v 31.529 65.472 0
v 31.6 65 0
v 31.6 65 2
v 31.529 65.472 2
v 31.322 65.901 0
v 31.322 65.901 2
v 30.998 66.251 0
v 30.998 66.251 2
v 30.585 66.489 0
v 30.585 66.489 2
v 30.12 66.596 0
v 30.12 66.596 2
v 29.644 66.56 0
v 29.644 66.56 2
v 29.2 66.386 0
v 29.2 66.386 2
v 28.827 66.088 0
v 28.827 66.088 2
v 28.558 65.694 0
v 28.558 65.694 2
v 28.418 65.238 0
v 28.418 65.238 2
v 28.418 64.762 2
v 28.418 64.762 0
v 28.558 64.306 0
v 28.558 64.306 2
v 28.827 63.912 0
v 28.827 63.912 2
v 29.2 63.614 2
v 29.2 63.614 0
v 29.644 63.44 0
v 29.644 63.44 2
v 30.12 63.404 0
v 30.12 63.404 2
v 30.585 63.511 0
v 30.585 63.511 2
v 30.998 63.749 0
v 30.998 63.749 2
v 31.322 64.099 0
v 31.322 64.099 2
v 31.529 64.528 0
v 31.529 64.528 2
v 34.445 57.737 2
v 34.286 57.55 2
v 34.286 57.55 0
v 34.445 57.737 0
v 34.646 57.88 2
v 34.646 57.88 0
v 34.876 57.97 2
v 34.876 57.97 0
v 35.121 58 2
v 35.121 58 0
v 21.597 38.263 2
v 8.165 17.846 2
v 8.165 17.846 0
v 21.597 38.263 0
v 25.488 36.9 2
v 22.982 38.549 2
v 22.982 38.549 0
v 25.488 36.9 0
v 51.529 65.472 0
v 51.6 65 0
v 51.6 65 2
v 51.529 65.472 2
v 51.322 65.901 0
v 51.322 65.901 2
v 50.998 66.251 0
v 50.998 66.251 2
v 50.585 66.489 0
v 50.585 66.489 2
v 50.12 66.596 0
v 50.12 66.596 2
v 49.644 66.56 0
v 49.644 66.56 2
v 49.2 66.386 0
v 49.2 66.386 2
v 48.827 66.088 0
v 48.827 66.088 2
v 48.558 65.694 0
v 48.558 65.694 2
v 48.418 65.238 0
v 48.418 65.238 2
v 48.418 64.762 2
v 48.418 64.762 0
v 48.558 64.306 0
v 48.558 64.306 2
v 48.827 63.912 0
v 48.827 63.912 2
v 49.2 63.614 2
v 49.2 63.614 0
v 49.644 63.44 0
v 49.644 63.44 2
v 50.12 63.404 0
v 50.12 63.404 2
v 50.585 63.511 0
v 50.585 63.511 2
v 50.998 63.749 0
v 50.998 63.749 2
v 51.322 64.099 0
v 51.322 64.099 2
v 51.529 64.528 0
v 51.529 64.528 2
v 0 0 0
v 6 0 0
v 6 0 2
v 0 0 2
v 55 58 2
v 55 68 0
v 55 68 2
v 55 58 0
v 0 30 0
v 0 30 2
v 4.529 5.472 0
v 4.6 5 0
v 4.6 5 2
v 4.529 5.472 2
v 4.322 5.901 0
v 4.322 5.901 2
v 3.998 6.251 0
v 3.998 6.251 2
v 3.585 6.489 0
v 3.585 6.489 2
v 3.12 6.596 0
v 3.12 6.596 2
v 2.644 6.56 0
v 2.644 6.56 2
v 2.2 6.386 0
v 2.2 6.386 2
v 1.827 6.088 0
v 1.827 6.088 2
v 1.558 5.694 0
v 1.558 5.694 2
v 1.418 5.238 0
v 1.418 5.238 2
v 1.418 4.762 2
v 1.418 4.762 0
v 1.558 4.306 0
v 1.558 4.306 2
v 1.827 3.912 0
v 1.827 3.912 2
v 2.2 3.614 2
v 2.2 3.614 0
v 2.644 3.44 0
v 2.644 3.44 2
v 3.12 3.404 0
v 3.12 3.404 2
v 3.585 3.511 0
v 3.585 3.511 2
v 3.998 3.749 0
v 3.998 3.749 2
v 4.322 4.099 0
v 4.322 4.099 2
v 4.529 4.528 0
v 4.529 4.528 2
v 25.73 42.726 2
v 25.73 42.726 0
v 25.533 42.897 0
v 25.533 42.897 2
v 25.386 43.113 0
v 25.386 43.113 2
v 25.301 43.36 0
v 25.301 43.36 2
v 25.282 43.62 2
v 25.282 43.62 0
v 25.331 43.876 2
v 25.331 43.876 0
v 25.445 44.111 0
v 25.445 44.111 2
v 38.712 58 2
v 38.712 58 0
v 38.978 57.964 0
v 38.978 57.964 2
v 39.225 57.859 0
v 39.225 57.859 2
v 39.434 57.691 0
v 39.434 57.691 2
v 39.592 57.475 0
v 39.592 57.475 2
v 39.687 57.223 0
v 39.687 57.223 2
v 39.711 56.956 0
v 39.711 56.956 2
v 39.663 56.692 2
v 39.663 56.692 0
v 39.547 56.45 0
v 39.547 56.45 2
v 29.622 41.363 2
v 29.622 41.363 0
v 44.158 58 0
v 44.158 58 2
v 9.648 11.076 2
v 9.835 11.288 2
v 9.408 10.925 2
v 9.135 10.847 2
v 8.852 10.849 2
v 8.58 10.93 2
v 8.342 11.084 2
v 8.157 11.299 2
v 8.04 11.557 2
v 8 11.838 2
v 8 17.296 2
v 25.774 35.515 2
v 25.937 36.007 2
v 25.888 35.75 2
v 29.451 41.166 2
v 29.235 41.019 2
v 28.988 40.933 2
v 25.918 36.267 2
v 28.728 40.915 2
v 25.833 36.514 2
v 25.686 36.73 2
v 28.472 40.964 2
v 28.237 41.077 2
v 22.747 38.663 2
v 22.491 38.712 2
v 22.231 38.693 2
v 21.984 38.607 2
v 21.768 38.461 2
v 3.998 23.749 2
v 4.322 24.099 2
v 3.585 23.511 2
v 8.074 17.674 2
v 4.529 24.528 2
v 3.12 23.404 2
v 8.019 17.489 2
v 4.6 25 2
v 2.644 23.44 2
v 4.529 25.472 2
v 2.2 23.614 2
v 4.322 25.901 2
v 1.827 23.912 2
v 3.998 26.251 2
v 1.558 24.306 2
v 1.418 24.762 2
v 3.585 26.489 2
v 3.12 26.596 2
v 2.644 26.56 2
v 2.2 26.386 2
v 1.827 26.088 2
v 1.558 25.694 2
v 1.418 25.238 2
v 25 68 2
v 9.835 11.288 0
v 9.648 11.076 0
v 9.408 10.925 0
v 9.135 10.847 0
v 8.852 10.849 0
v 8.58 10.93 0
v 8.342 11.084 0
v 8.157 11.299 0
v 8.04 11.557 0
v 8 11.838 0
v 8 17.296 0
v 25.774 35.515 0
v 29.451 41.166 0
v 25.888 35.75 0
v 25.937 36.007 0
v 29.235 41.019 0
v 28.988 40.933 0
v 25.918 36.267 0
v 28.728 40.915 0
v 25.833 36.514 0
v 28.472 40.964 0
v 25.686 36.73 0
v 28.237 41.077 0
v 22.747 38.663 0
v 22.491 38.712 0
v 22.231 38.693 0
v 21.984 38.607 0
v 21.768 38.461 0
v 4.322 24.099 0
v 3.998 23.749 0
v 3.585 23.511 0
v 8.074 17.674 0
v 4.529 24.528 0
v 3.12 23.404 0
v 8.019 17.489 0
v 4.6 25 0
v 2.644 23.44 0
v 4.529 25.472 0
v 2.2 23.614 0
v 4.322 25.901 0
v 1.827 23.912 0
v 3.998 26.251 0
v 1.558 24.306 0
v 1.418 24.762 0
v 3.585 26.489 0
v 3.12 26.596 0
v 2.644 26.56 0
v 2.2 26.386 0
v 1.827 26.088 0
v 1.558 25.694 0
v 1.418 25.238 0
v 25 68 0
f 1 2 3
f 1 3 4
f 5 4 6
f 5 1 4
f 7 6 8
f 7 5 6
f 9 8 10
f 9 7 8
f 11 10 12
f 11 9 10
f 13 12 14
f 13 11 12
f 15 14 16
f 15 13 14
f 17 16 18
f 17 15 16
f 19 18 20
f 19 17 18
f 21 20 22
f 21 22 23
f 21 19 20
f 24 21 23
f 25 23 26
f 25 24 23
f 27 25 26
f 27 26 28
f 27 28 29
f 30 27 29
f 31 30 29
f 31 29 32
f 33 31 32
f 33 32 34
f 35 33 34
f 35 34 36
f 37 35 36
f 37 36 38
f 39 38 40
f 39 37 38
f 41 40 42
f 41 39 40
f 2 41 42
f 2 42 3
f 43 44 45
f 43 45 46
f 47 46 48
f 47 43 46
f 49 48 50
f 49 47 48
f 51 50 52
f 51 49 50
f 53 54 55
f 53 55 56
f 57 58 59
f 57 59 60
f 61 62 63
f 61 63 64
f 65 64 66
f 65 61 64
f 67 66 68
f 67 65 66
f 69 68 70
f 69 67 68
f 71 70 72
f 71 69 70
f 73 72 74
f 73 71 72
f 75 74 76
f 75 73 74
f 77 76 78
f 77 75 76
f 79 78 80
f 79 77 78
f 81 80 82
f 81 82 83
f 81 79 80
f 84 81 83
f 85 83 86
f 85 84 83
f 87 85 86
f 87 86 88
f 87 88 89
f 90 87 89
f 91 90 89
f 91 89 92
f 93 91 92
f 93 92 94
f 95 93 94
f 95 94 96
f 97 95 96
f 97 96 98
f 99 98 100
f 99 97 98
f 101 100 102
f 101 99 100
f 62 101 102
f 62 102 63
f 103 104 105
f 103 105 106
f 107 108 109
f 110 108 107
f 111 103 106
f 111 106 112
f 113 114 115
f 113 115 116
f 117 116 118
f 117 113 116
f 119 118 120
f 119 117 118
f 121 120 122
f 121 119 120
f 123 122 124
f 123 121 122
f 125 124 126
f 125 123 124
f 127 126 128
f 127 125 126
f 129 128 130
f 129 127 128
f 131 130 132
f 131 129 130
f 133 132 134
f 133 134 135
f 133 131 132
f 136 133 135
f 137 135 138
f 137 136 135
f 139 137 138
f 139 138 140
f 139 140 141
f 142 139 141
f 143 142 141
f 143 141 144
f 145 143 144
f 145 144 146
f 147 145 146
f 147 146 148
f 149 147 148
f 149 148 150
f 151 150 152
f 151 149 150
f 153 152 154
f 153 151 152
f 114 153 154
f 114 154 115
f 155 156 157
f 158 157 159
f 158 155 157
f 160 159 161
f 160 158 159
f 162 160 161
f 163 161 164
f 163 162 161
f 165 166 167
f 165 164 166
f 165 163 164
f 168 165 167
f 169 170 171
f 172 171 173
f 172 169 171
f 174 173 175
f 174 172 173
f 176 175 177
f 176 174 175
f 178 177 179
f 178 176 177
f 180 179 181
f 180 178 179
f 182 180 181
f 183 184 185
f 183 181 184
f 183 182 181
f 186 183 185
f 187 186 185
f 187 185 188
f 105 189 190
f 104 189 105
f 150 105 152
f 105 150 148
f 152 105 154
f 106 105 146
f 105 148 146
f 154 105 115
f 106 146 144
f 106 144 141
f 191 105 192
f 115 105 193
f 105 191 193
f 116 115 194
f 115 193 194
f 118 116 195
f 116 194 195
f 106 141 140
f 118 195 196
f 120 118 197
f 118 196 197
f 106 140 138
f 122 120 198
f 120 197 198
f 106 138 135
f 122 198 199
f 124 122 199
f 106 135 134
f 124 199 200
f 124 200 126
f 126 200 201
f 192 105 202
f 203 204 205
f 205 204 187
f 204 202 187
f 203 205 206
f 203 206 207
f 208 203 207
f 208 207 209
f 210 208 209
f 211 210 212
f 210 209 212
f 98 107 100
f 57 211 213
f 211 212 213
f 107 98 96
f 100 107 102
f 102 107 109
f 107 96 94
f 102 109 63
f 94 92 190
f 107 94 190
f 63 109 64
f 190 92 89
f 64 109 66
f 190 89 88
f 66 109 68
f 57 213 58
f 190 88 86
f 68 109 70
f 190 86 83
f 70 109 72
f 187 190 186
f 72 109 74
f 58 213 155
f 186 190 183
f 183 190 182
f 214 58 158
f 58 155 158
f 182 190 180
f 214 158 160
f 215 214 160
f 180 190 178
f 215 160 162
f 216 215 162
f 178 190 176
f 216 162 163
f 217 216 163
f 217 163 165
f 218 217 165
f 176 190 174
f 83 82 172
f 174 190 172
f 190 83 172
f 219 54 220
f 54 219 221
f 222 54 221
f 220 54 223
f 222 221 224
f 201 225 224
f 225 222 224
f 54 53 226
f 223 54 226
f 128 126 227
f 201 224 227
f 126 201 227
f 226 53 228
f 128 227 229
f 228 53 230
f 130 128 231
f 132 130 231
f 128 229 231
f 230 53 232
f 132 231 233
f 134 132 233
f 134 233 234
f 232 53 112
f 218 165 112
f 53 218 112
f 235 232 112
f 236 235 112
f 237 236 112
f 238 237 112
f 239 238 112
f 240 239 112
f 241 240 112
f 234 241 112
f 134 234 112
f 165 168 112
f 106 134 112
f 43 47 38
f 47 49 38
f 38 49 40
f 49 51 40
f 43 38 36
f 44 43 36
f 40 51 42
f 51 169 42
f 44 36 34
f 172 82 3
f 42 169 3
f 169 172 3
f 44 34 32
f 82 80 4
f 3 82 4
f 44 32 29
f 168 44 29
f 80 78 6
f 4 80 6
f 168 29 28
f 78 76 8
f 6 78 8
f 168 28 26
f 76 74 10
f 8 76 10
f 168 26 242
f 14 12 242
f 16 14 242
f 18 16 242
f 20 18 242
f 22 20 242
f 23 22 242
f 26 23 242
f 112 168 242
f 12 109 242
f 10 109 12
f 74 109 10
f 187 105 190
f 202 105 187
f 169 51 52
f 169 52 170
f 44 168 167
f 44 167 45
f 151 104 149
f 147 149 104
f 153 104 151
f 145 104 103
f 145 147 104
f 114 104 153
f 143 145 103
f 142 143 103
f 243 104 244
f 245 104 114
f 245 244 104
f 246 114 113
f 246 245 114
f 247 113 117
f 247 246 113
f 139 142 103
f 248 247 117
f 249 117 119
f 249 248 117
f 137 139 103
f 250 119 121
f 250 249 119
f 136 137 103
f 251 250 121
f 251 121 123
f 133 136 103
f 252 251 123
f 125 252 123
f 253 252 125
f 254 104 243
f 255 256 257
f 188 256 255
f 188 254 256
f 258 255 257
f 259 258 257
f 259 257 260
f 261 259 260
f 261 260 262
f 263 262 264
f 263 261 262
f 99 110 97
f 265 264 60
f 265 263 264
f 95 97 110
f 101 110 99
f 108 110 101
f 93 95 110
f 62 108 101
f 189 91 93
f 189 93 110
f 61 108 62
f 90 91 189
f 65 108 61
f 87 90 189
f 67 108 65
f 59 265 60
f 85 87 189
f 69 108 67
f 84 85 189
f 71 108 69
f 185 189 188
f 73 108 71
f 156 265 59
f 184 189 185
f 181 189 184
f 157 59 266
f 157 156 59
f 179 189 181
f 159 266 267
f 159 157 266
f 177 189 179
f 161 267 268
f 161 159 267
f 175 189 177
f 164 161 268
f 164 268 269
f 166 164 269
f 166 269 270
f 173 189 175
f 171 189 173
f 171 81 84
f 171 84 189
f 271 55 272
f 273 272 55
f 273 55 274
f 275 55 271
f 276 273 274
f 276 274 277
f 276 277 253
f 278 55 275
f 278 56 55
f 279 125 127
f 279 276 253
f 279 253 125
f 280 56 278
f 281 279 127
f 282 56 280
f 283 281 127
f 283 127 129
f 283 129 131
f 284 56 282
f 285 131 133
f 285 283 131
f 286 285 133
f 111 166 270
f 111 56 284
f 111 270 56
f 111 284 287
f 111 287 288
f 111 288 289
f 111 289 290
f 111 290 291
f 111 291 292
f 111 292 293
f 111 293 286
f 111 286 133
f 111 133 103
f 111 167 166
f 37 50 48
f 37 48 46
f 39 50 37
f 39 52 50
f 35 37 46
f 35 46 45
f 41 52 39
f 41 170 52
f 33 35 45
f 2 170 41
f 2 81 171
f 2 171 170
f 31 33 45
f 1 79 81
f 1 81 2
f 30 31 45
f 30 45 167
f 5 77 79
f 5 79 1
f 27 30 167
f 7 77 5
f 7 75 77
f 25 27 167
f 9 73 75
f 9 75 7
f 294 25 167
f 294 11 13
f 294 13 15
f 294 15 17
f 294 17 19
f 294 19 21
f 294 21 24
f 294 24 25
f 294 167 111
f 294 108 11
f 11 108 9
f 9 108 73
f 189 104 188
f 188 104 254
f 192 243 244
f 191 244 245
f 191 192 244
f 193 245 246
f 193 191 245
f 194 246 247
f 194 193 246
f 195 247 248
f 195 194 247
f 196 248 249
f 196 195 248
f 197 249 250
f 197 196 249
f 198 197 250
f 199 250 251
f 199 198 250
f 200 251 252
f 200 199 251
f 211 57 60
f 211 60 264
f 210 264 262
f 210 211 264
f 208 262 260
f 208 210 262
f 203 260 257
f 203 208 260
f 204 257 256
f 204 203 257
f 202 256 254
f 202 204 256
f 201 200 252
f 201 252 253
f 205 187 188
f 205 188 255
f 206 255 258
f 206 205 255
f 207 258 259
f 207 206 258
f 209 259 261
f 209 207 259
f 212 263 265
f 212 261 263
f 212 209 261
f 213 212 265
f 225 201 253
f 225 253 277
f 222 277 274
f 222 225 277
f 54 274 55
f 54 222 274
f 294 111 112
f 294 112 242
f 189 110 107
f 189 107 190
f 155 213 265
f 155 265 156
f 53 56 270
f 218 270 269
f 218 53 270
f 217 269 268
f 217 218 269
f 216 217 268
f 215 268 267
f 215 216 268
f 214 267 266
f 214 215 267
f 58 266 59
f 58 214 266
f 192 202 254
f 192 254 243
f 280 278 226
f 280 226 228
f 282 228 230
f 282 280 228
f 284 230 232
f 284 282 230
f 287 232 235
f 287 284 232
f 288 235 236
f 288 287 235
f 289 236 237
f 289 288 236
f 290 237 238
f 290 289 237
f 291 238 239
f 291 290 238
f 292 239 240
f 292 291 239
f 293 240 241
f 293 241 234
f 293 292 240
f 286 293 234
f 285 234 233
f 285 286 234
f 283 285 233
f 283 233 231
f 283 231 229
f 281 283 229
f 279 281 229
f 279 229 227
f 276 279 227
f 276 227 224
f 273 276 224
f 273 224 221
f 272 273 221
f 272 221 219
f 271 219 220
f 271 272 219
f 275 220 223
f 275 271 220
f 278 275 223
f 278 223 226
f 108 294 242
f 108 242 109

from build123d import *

# Parameters (mm, degrees)
SKETCH_1_R          = 1.6
EXTRUDE_1_DEPTH     = 2
CUT_EXTRUDE_1_DEPTH = 88.4814266


with BuildPart() as part:
    # 草图1 → 凸台-拉伸1 (new body)
    with BuildSketch(Plane.XY):
        Polygon((0, 0), (0, 30), (25, 68), (55, 68), (55, 58), (44.157894737, 58), (6, 0), align=None)
        with Locations((3, 25)):
            Circle(SKETCH_1_R, mode=Mode.SUBTRACT)
        with Locations((3, 5)):
            Circle(SKETCH_1_R, mode=Mode.SUBTRACT)
        with Locations((30, 65)):
            Circle(SKETCH_1_R, mode=Mode.SUBTRACT)
        with Locations((50, 65)):
            Circle(SKETCH_1_R, mode=Mode.SUBTRACT)
    extrude(amount=EXTRUDE_1_DEPTH)

    # 草图2 → 切除-拉伸1 (cut, through all)
    with BuildSketch(Plane.XY.offset(2)):
        with BuildLine():
            Line((35.120951799, 58), (38.711972457, 58))
            ThreePointArc((38.711972457, 58), (39.592204387, 57.474543727), (39.547389539, 56.450383499))
            Line((39.547389539, 56.450383499), (29.621611135, 41.363200325))
            ThreePointArc((29.621611135, 41.363200325), (28.988285582, 40.933450188), (28.236577552, 41.077399744))
            Line((28.236577552, 41.077399744), (25.730326305, 42.726249249))
            ThreePointArc((25.730326305, 42.726249249), (25.300576167, 43.359574802), (25.444525724, 44.111282833))
            Line((25.444525724, 44.111282833), (34.285534717, 57.549616501))
            ThreePointArc((34.285534717, 57.549616501), (34.646408072, 57.88023193), (35.120951799, 58))
        make_face()
        with BuildLine():
            Line((8, 11.837801866), (8, 17.296153265))
            ThreePointArc((8, 17.296153265), (8.042028946, 17.583018145), (8.164582918, 17.845769767))
            Line((8.164582918, 17.845769767), (21.597210214, 38.263363257))
            ThreePointArc((21.597210214, 38.263363257), (22.230535767, 38.693113395), (22.982243798, 38.549163838))
            Line((22.982243798, 38.549163838), (25.488495044, 36.900314333))
            ThreePointArc((25.488495044, 36.900314333), (25.918245182, 36.26698878), (25.774295625, 35.51528075))
            Line((25.774295625, 35.51528075), (9.835417082, 11.288185364))
            ThreePointArc((9.835417082, 11.288185364), (8.713135121, 10.879830812), (8, 11.837801866))
        make_face()
    extrude(amount=-CUT_EXTRUDE_1_DEPTH, mode=Mode.SUBTRACT)


solid = part.part
